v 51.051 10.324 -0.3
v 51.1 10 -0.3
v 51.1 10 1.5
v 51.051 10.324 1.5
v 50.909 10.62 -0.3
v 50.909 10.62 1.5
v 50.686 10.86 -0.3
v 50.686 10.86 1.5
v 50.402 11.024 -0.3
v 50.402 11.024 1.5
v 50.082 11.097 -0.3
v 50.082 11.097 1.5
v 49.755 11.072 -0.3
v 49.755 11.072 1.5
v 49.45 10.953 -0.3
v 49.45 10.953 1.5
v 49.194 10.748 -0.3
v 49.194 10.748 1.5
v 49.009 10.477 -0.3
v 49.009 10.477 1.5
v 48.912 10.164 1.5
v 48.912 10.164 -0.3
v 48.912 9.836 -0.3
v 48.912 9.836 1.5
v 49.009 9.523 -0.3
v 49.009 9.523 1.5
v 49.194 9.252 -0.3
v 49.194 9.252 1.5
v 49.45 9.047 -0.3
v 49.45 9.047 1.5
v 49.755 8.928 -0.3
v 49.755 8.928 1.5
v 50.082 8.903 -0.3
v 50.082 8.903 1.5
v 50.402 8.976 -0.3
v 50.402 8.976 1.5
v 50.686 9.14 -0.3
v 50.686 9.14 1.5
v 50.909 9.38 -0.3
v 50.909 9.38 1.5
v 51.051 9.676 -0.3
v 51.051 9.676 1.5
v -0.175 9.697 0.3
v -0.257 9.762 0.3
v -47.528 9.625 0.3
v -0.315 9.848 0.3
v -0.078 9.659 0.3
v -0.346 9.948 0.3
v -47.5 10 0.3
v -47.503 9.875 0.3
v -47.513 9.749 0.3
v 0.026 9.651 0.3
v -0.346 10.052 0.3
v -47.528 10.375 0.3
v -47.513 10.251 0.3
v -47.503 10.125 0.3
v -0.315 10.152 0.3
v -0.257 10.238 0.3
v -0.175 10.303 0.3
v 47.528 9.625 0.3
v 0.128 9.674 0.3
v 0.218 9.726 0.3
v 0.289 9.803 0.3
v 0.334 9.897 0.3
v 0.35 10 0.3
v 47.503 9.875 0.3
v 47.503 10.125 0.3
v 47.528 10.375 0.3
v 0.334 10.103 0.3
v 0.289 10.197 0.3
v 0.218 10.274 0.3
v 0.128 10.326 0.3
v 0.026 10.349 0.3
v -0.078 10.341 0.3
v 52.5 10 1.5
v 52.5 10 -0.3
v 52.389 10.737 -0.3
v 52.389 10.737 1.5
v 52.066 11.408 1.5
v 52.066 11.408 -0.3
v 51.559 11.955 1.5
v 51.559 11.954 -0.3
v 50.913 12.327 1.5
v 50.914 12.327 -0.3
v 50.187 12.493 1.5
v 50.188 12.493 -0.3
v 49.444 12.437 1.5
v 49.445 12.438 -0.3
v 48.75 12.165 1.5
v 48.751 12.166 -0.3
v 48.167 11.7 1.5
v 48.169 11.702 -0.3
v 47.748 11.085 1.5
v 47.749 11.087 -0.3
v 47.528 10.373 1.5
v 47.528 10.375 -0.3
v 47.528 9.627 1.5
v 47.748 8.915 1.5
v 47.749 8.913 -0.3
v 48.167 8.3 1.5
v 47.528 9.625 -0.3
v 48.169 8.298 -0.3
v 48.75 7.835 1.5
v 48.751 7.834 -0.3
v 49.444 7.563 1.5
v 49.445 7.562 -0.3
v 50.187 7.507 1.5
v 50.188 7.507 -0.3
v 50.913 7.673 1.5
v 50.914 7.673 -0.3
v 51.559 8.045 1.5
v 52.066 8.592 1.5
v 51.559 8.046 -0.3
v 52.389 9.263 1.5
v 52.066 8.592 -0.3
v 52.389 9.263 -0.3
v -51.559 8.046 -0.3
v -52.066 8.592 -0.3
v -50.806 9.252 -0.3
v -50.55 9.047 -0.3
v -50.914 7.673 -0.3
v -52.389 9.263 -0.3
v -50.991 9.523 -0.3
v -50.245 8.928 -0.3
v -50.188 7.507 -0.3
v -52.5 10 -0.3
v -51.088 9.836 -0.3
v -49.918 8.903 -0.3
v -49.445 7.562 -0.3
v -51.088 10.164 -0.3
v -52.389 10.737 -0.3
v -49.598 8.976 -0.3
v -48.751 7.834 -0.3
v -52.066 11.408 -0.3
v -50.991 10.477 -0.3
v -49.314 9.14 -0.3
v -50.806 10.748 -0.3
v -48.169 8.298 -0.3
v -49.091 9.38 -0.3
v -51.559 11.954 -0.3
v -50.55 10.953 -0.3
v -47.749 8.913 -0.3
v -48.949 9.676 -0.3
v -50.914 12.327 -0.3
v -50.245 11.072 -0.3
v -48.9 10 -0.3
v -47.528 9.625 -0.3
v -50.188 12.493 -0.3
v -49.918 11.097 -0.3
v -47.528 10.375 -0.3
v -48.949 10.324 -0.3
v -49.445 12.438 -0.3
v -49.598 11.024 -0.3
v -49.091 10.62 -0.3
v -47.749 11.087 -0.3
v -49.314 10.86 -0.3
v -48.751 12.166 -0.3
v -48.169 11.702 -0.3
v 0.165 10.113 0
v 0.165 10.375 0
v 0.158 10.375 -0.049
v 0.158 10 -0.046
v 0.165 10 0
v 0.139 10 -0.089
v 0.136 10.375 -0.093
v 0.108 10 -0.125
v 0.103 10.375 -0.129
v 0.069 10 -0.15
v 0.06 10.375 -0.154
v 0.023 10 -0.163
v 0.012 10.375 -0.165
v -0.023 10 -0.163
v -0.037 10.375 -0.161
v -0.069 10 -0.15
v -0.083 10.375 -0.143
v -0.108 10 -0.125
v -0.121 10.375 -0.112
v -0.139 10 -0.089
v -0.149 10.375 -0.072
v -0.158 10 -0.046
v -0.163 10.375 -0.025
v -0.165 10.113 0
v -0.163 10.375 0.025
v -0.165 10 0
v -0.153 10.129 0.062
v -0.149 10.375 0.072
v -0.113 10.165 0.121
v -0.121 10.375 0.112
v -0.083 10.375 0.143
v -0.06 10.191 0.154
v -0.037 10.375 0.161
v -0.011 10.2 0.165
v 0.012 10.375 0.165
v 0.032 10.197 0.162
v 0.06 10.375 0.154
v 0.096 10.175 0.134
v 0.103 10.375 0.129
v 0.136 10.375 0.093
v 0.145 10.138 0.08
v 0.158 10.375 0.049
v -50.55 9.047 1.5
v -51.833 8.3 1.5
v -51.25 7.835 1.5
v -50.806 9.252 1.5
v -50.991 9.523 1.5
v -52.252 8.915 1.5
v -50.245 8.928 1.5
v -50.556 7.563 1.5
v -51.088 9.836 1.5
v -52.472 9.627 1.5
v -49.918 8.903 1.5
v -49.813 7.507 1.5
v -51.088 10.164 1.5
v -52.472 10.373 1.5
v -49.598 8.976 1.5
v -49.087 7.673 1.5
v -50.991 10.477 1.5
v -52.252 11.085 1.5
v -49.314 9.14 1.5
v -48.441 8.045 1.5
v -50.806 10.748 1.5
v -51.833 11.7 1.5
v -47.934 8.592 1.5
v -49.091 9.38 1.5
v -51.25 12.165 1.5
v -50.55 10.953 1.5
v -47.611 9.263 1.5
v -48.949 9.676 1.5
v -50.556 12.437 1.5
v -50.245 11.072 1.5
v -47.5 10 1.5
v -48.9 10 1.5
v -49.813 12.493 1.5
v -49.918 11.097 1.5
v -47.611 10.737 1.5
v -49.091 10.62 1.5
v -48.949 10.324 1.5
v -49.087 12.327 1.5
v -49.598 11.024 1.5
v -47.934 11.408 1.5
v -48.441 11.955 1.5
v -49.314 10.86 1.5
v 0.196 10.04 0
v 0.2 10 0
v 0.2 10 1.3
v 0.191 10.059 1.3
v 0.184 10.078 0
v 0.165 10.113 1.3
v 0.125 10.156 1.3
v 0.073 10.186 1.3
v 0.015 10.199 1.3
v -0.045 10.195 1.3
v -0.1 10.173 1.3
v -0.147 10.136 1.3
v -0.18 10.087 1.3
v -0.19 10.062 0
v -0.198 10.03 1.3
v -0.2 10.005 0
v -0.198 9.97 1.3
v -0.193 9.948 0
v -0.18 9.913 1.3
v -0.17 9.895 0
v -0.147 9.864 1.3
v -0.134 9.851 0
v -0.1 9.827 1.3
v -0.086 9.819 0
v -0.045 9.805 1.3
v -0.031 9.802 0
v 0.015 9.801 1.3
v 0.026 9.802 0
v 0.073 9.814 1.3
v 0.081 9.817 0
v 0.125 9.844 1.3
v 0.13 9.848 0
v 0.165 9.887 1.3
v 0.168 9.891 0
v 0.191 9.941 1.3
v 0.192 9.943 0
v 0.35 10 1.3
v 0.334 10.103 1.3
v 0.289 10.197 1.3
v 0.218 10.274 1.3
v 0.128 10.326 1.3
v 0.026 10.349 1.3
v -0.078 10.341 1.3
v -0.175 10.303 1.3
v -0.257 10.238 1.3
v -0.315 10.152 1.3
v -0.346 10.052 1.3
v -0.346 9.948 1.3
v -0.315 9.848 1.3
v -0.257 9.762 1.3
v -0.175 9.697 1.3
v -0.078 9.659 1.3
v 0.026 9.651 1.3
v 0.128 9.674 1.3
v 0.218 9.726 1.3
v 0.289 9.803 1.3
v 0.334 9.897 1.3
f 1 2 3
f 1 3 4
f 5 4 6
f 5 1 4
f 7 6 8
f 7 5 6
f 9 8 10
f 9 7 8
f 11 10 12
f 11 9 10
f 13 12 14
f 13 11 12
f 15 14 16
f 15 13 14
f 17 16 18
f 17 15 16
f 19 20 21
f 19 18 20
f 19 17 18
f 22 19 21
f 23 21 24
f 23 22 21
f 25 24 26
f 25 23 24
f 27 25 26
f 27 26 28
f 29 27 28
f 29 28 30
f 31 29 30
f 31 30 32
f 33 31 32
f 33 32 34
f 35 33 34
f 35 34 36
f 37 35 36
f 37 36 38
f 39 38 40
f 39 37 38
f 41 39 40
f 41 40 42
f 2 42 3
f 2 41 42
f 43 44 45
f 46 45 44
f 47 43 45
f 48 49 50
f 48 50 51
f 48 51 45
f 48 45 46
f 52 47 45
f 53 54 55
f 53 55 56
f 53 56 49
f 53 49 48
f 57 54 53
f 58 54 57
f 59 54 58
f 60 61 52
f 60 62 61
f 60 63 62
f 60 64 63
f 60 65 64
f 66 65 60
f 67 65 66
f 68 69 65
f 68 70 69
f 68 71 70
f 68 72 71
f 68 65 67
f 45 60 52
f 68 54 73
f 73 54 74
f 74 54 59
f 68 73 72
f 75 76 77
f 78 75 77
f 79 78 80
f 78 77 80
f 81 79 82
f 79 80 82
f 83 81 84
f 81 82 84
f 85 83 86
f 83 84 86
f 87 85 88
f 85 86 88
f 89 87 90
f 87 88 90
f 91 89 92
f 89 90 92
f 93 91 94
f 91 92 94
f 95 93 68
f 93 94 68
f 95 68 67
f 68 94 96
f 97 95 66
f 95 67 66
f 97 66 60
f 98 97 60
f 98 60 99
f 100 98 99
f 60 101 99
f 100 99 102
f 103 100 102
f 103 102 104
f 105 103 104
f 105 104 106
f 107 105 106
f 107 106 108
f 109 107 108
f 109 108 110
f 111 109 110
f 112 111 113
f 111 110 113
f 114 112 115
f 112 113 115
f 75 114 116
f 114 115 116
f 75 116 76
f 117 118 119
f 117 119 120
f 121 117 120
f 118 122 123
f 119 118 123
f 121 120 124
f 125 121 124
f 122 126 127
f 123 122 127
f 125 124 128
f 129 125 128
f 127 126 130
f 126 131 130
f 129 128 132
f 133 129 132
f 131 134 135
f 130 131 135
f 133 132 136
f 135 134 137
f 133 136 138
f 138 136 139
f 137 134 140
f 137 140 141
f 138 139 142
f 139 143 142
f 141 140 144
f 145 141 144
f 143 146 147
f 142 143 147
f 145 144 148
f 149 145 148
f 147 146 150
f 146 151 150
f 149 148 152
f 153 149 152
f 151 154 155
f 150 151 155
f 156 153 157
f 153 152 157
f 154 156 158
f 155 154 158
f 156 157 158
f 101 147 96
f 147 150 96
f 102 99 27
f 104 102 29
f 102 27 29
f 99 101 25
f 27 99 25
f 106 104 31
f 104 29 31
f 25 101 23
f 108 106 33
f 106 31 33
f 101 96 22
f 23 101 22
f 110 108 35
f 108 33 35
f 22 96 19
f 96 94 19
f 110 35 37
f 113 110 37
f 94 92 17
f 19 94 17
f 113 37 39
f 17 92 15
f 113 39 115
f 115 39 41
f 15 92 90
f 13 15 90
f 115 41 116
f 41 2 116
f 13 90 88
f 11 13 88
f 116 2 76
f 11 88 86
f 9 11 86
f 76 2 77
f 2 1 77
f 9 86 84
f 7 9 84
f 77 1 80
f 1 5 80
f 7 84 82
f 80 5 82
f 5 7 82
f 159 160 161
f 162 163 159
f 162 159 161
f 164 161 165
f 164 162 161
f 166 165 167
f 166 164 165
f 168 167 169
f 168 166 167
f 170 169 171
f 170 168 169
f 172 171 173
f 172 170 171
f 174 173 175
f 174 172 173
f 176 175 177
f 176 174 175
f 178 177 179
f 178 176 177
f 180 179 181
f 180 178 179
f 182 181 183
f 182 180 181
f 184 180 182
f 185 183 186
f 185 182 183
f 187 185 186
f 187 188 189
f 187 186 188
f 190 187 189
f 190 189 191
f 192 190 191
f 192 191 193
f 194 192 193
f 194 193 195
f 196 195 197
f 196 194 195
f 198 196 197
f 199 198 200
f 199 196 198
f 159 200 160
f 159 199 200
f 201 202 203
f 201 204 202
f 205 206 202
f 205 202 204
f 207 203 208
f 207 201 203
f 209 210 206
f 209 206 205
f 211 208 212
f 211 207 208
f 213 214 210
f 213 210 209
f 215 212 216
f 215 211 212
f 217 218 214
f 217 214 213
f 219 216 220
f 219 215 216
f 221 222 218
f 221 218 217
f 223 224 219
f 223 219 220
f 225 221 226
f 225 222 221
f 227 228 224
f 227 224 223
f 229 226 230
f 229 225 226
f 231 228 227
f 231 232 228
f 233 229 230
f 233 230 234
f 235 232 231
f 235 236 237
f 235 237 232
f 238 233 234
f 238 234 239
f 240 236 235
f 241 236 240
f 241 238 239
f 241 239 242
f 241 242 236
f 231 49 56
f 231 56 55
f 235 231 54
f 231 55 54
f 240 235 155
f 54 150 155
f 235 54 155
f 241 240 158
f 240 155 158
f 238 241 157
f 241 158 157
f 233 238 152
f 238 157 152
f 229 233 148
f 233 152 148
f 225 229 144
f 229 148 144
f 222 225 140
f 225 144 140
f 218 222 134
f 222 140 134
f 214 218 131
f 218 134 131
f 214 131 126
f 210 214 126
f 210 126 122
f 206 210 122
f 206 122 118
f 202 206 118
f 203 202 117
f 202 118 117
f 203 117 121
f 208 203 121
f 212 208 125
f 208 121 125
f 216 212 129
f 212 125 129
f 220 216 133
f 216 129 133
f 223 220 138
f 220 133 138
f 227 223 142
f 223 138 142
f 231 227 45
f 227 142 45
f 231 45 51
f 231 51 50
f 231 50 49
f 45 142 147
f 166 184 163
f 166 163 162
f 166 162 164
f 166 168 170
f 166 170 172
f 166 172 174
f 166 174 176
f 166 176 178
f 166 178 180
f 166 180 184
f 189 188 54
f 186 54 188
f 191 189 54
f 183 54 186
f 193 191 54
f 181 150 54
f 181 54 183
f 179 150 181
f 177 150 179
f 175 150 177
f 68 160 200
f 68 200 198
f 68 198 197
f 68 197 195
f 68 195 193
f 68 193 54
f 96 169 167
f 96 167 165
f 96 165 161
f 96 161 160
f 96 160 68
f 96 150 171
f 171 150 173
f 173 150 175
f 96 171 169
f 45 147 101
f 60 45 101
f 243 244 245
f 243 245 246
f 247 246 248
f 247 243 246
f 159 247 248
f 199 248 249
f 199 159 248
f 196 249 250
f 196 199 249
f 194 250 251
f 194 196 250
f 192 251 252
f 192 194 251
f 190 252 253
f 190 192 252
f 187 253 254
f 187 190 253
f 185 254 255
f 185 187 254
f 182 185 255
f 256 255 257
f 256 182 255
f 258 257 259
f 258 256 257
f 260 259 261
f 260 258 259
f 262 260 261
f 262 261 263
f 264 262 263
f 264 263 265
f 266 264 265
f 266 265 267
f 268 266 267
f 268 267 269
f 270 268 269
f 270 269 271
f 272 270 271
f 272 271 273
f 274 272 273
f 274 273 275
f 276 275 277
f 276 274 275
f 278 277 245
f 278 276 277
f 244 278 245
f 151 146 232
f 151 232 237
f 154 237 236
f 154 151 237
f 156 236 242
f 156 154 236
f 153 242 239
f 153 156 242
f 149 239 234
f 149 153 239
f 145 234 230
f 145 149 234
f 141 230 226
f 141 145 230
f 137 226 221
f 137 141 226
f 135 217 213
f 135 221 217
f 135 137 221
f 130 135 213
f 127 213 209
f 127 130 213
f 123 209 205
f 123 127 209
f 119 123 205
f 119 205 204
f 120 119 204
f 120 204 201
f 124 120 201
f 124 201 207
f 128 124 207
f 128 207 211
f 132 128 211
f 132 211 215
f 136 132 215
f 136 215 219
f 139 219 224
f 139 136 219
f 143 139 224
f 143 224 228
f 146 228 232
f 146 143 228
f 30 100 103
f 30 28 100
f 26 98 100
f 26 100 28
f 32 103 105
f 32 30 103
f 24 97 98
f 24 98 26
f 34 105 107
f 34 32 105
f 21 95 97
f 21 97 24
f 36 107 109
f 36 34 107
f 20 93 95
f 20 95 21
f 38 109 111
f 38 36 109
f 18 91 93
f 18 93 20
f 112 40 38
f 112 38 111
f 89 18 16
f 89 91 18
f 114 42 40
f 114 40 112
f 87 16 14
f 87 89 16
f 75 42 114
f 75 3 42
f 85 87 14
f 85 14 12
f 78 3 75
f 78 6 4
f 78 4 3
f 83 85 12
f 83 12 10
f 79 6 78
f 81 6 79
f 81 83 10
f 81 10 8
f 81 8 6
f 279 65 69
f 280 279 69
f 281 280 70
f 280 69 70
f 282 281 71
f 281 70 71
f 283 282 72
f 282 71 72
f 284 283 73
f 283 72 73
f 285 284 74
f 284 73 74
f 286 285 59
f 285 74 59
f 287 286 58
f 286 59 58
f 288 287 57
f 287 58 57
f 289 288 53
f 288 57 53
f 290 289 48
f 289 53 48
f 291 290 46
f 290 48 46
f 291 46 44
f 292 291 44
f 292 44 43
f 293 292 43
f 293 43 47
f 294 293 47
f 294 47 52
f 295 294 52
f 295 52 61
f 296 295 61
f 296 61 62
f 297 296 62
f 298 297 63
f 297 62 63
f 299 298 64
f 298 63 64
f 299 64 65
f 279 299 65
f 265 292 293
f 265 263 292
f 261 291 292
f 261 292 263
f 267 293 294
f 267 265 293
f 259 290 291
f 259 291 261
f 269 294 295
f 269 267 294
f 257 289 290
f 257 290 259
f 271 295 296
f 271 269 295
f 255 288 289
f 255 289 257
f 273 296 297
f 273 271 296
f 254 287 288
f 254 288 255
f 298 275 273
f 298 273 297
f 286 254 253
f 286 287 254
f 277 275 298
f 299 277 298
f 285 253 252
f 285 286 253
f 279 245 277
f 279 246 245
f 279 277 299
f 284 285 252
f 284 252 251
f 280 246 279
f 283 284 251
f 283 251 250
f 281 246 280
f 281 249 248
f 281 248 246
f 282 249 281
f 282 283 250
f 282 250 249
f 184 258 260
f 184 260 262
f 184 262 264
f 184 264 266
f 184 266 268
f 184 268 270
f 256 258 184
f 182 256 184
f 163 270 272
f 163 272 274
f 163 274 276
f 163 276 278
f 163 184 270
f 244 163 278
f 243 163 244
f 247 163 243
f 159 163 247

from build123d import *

# Parameters (mm, degrees)
CYLINDER144_R     = 0.8
CYLINDER144_DEPTH = 10
CYLINDER136_R     = 0.2
CYLINDER136_DEPTH = 9
CYLINDER_R        = 1.1
CYLINDER_DEPTH    = 4
CYLINDER139_R     = 1.1
CYLINDER139_DEPTH = 4
CYLINDER138_R     = 0.165
CYLINDER138_DEPTH = 8
CYLINDER143_R     = 0.8
CYLINDER143_DEPTH = 10
CYLINDER142_R     = 2.5
CYLINDER142_DEPTH = 1.8
CYLINDER141_R     = 2.5
CYLINDER141_DEPTH = 1.8
CYLINDER140_R     = 0.35
CYLINDER140_DEPTH = 1
BOX_W             = 100
BOX_H             = 0.75
BOX_DEPTH         = 0.6


with BuildPart() as cylinder001:
    # Cylinder144 → Cylinder144 (new body)
    with BuildSketch(Plane(origin=(6.3, -2.8, -1), x_dir=(1, 0, 0), z_dir=(0, 0, 1))):
        Circle(CYLINDER144_R)
    extrude(amount=CYLINDER144_DEPTH)


with BuildPart() as bowtienozzle:
    # Cylinder136 → Cylinder136 (new body)
    with BuildSketch(Plane.XY):
        Circle(CYLINDER136_R)
    extrude(amount=CYLINDER136_DEPTH)


with BuildPart() as mountinghole1:
    # Cylinder → Cylinder (new body)
    with BuildSketch(Plane(origin=(-50, 0, -1), x_dir=(1, 0, 0), z_dir=(0, 0, 1))):
        Circle(CYLINDER_R)
    extrude(amount=CYLINDER_DEPTH)


with BuildPart() as mountinghole2:
    # Cylinder139 → Cylinder139 (new body)
    with BuildSketch(Plane(origin=(50, 0, -1), x_dir=(1, 0, 0), z_dir=(0, 0, 1))):
        Circle(CYLINDER139_R)
    extrude(amount=CYLINDER139_DEPTH)


with BuildPart() as fusion001:
    # Cylinder138 → Cylinder138 (new body)
    with BuildSketch(Plane(origin=(0, 0, 0), x_dir=(1, 0, 0), z_dir=(0, 1, 0))):
        Circle(CYLINDER138_R)
    extrude(amount=CYLINDER138_DEPTH)

    # Fusion001: union BowTieNozzle, MountingHole1, MountingHole2
    add(bowtienozzle.part)
    add(mountinghole1.part)
    add(mountinghole2.part)


with BuildPart() as fusion003:
    # Cylinder143 → Cylinder143 (new body)
    with BuildSketch(Plane(origin=(-6.3, -2.8, -1), x_dir=(1, 0, 0), z_dir=(0, 0, 1))):
        Circle(CYLINDER143_R)
    extrude(amount=CYLINDER143_DEPTH)

    # Fusion003: union Cylinder001, Fusion001
    add(cylinder001.part)
    add(fusion001.part)


with BuildPart() as mountingholeod001:
    # Cylinder142 → Cylinder142 (new body)
    with BuildSketch(Plane(origin=(50, 0, -0.3), x_dir=(1, 0, 0), z_dir=(0, 0, 1))):
        Circle(CYLINDER142_R)
    extrude(amount=CYLINDER142_DEPTH)


with BuildPart() as mountingholeod:
    # Cylinder141 → Cylinder141 (new body)
    with BuildSketch(Plane(origin=(-50, 0, -0.3), x_dir=(1, 0, 0), z_dir=(0, 0, 1))):
        Circle(CYLINDER141_R)
    extrude(amount=CYLINDER141_DEPTH)


with BuildPart() as nozzle_od:
    # Cylinder140 → Cylinder140 (new body)
    with BuildSketch(Plane.XY.offset(0.3)):
        Circle(CYLINDER140_R)
    extrude(amount=CYLINDER140_DEPTH)


with BuildPart() as cut004:
    # Box → Box (new body)
    with BuildSketch(Plane(origin=(-50, -0.375, -0.3), x_dir=(1, 0, 0), z_dir=(0, 0, 1))):
        with Locations((50, 0.375)):
            Rectangle(BOX_W, BOX_H)
    extrude(amount=BOX_DEPTH)

    # Fusion: union MountingHoleOD001, MountingHoleOD, Nozzle_OD
    add(mountingholeod001.part)
    add(mountingholeod.part)
    add(nozzle_od.part)

    # Cut004: cut Fusion003
    add(fusion003.part, mode=Mode.SUBTRACT)


with BuildPart() as cut004_1:
    # Cut004 placement: moved
    add(cut004.part.moved(Location((0, 10, 0))))


solid = cut004_1.part
